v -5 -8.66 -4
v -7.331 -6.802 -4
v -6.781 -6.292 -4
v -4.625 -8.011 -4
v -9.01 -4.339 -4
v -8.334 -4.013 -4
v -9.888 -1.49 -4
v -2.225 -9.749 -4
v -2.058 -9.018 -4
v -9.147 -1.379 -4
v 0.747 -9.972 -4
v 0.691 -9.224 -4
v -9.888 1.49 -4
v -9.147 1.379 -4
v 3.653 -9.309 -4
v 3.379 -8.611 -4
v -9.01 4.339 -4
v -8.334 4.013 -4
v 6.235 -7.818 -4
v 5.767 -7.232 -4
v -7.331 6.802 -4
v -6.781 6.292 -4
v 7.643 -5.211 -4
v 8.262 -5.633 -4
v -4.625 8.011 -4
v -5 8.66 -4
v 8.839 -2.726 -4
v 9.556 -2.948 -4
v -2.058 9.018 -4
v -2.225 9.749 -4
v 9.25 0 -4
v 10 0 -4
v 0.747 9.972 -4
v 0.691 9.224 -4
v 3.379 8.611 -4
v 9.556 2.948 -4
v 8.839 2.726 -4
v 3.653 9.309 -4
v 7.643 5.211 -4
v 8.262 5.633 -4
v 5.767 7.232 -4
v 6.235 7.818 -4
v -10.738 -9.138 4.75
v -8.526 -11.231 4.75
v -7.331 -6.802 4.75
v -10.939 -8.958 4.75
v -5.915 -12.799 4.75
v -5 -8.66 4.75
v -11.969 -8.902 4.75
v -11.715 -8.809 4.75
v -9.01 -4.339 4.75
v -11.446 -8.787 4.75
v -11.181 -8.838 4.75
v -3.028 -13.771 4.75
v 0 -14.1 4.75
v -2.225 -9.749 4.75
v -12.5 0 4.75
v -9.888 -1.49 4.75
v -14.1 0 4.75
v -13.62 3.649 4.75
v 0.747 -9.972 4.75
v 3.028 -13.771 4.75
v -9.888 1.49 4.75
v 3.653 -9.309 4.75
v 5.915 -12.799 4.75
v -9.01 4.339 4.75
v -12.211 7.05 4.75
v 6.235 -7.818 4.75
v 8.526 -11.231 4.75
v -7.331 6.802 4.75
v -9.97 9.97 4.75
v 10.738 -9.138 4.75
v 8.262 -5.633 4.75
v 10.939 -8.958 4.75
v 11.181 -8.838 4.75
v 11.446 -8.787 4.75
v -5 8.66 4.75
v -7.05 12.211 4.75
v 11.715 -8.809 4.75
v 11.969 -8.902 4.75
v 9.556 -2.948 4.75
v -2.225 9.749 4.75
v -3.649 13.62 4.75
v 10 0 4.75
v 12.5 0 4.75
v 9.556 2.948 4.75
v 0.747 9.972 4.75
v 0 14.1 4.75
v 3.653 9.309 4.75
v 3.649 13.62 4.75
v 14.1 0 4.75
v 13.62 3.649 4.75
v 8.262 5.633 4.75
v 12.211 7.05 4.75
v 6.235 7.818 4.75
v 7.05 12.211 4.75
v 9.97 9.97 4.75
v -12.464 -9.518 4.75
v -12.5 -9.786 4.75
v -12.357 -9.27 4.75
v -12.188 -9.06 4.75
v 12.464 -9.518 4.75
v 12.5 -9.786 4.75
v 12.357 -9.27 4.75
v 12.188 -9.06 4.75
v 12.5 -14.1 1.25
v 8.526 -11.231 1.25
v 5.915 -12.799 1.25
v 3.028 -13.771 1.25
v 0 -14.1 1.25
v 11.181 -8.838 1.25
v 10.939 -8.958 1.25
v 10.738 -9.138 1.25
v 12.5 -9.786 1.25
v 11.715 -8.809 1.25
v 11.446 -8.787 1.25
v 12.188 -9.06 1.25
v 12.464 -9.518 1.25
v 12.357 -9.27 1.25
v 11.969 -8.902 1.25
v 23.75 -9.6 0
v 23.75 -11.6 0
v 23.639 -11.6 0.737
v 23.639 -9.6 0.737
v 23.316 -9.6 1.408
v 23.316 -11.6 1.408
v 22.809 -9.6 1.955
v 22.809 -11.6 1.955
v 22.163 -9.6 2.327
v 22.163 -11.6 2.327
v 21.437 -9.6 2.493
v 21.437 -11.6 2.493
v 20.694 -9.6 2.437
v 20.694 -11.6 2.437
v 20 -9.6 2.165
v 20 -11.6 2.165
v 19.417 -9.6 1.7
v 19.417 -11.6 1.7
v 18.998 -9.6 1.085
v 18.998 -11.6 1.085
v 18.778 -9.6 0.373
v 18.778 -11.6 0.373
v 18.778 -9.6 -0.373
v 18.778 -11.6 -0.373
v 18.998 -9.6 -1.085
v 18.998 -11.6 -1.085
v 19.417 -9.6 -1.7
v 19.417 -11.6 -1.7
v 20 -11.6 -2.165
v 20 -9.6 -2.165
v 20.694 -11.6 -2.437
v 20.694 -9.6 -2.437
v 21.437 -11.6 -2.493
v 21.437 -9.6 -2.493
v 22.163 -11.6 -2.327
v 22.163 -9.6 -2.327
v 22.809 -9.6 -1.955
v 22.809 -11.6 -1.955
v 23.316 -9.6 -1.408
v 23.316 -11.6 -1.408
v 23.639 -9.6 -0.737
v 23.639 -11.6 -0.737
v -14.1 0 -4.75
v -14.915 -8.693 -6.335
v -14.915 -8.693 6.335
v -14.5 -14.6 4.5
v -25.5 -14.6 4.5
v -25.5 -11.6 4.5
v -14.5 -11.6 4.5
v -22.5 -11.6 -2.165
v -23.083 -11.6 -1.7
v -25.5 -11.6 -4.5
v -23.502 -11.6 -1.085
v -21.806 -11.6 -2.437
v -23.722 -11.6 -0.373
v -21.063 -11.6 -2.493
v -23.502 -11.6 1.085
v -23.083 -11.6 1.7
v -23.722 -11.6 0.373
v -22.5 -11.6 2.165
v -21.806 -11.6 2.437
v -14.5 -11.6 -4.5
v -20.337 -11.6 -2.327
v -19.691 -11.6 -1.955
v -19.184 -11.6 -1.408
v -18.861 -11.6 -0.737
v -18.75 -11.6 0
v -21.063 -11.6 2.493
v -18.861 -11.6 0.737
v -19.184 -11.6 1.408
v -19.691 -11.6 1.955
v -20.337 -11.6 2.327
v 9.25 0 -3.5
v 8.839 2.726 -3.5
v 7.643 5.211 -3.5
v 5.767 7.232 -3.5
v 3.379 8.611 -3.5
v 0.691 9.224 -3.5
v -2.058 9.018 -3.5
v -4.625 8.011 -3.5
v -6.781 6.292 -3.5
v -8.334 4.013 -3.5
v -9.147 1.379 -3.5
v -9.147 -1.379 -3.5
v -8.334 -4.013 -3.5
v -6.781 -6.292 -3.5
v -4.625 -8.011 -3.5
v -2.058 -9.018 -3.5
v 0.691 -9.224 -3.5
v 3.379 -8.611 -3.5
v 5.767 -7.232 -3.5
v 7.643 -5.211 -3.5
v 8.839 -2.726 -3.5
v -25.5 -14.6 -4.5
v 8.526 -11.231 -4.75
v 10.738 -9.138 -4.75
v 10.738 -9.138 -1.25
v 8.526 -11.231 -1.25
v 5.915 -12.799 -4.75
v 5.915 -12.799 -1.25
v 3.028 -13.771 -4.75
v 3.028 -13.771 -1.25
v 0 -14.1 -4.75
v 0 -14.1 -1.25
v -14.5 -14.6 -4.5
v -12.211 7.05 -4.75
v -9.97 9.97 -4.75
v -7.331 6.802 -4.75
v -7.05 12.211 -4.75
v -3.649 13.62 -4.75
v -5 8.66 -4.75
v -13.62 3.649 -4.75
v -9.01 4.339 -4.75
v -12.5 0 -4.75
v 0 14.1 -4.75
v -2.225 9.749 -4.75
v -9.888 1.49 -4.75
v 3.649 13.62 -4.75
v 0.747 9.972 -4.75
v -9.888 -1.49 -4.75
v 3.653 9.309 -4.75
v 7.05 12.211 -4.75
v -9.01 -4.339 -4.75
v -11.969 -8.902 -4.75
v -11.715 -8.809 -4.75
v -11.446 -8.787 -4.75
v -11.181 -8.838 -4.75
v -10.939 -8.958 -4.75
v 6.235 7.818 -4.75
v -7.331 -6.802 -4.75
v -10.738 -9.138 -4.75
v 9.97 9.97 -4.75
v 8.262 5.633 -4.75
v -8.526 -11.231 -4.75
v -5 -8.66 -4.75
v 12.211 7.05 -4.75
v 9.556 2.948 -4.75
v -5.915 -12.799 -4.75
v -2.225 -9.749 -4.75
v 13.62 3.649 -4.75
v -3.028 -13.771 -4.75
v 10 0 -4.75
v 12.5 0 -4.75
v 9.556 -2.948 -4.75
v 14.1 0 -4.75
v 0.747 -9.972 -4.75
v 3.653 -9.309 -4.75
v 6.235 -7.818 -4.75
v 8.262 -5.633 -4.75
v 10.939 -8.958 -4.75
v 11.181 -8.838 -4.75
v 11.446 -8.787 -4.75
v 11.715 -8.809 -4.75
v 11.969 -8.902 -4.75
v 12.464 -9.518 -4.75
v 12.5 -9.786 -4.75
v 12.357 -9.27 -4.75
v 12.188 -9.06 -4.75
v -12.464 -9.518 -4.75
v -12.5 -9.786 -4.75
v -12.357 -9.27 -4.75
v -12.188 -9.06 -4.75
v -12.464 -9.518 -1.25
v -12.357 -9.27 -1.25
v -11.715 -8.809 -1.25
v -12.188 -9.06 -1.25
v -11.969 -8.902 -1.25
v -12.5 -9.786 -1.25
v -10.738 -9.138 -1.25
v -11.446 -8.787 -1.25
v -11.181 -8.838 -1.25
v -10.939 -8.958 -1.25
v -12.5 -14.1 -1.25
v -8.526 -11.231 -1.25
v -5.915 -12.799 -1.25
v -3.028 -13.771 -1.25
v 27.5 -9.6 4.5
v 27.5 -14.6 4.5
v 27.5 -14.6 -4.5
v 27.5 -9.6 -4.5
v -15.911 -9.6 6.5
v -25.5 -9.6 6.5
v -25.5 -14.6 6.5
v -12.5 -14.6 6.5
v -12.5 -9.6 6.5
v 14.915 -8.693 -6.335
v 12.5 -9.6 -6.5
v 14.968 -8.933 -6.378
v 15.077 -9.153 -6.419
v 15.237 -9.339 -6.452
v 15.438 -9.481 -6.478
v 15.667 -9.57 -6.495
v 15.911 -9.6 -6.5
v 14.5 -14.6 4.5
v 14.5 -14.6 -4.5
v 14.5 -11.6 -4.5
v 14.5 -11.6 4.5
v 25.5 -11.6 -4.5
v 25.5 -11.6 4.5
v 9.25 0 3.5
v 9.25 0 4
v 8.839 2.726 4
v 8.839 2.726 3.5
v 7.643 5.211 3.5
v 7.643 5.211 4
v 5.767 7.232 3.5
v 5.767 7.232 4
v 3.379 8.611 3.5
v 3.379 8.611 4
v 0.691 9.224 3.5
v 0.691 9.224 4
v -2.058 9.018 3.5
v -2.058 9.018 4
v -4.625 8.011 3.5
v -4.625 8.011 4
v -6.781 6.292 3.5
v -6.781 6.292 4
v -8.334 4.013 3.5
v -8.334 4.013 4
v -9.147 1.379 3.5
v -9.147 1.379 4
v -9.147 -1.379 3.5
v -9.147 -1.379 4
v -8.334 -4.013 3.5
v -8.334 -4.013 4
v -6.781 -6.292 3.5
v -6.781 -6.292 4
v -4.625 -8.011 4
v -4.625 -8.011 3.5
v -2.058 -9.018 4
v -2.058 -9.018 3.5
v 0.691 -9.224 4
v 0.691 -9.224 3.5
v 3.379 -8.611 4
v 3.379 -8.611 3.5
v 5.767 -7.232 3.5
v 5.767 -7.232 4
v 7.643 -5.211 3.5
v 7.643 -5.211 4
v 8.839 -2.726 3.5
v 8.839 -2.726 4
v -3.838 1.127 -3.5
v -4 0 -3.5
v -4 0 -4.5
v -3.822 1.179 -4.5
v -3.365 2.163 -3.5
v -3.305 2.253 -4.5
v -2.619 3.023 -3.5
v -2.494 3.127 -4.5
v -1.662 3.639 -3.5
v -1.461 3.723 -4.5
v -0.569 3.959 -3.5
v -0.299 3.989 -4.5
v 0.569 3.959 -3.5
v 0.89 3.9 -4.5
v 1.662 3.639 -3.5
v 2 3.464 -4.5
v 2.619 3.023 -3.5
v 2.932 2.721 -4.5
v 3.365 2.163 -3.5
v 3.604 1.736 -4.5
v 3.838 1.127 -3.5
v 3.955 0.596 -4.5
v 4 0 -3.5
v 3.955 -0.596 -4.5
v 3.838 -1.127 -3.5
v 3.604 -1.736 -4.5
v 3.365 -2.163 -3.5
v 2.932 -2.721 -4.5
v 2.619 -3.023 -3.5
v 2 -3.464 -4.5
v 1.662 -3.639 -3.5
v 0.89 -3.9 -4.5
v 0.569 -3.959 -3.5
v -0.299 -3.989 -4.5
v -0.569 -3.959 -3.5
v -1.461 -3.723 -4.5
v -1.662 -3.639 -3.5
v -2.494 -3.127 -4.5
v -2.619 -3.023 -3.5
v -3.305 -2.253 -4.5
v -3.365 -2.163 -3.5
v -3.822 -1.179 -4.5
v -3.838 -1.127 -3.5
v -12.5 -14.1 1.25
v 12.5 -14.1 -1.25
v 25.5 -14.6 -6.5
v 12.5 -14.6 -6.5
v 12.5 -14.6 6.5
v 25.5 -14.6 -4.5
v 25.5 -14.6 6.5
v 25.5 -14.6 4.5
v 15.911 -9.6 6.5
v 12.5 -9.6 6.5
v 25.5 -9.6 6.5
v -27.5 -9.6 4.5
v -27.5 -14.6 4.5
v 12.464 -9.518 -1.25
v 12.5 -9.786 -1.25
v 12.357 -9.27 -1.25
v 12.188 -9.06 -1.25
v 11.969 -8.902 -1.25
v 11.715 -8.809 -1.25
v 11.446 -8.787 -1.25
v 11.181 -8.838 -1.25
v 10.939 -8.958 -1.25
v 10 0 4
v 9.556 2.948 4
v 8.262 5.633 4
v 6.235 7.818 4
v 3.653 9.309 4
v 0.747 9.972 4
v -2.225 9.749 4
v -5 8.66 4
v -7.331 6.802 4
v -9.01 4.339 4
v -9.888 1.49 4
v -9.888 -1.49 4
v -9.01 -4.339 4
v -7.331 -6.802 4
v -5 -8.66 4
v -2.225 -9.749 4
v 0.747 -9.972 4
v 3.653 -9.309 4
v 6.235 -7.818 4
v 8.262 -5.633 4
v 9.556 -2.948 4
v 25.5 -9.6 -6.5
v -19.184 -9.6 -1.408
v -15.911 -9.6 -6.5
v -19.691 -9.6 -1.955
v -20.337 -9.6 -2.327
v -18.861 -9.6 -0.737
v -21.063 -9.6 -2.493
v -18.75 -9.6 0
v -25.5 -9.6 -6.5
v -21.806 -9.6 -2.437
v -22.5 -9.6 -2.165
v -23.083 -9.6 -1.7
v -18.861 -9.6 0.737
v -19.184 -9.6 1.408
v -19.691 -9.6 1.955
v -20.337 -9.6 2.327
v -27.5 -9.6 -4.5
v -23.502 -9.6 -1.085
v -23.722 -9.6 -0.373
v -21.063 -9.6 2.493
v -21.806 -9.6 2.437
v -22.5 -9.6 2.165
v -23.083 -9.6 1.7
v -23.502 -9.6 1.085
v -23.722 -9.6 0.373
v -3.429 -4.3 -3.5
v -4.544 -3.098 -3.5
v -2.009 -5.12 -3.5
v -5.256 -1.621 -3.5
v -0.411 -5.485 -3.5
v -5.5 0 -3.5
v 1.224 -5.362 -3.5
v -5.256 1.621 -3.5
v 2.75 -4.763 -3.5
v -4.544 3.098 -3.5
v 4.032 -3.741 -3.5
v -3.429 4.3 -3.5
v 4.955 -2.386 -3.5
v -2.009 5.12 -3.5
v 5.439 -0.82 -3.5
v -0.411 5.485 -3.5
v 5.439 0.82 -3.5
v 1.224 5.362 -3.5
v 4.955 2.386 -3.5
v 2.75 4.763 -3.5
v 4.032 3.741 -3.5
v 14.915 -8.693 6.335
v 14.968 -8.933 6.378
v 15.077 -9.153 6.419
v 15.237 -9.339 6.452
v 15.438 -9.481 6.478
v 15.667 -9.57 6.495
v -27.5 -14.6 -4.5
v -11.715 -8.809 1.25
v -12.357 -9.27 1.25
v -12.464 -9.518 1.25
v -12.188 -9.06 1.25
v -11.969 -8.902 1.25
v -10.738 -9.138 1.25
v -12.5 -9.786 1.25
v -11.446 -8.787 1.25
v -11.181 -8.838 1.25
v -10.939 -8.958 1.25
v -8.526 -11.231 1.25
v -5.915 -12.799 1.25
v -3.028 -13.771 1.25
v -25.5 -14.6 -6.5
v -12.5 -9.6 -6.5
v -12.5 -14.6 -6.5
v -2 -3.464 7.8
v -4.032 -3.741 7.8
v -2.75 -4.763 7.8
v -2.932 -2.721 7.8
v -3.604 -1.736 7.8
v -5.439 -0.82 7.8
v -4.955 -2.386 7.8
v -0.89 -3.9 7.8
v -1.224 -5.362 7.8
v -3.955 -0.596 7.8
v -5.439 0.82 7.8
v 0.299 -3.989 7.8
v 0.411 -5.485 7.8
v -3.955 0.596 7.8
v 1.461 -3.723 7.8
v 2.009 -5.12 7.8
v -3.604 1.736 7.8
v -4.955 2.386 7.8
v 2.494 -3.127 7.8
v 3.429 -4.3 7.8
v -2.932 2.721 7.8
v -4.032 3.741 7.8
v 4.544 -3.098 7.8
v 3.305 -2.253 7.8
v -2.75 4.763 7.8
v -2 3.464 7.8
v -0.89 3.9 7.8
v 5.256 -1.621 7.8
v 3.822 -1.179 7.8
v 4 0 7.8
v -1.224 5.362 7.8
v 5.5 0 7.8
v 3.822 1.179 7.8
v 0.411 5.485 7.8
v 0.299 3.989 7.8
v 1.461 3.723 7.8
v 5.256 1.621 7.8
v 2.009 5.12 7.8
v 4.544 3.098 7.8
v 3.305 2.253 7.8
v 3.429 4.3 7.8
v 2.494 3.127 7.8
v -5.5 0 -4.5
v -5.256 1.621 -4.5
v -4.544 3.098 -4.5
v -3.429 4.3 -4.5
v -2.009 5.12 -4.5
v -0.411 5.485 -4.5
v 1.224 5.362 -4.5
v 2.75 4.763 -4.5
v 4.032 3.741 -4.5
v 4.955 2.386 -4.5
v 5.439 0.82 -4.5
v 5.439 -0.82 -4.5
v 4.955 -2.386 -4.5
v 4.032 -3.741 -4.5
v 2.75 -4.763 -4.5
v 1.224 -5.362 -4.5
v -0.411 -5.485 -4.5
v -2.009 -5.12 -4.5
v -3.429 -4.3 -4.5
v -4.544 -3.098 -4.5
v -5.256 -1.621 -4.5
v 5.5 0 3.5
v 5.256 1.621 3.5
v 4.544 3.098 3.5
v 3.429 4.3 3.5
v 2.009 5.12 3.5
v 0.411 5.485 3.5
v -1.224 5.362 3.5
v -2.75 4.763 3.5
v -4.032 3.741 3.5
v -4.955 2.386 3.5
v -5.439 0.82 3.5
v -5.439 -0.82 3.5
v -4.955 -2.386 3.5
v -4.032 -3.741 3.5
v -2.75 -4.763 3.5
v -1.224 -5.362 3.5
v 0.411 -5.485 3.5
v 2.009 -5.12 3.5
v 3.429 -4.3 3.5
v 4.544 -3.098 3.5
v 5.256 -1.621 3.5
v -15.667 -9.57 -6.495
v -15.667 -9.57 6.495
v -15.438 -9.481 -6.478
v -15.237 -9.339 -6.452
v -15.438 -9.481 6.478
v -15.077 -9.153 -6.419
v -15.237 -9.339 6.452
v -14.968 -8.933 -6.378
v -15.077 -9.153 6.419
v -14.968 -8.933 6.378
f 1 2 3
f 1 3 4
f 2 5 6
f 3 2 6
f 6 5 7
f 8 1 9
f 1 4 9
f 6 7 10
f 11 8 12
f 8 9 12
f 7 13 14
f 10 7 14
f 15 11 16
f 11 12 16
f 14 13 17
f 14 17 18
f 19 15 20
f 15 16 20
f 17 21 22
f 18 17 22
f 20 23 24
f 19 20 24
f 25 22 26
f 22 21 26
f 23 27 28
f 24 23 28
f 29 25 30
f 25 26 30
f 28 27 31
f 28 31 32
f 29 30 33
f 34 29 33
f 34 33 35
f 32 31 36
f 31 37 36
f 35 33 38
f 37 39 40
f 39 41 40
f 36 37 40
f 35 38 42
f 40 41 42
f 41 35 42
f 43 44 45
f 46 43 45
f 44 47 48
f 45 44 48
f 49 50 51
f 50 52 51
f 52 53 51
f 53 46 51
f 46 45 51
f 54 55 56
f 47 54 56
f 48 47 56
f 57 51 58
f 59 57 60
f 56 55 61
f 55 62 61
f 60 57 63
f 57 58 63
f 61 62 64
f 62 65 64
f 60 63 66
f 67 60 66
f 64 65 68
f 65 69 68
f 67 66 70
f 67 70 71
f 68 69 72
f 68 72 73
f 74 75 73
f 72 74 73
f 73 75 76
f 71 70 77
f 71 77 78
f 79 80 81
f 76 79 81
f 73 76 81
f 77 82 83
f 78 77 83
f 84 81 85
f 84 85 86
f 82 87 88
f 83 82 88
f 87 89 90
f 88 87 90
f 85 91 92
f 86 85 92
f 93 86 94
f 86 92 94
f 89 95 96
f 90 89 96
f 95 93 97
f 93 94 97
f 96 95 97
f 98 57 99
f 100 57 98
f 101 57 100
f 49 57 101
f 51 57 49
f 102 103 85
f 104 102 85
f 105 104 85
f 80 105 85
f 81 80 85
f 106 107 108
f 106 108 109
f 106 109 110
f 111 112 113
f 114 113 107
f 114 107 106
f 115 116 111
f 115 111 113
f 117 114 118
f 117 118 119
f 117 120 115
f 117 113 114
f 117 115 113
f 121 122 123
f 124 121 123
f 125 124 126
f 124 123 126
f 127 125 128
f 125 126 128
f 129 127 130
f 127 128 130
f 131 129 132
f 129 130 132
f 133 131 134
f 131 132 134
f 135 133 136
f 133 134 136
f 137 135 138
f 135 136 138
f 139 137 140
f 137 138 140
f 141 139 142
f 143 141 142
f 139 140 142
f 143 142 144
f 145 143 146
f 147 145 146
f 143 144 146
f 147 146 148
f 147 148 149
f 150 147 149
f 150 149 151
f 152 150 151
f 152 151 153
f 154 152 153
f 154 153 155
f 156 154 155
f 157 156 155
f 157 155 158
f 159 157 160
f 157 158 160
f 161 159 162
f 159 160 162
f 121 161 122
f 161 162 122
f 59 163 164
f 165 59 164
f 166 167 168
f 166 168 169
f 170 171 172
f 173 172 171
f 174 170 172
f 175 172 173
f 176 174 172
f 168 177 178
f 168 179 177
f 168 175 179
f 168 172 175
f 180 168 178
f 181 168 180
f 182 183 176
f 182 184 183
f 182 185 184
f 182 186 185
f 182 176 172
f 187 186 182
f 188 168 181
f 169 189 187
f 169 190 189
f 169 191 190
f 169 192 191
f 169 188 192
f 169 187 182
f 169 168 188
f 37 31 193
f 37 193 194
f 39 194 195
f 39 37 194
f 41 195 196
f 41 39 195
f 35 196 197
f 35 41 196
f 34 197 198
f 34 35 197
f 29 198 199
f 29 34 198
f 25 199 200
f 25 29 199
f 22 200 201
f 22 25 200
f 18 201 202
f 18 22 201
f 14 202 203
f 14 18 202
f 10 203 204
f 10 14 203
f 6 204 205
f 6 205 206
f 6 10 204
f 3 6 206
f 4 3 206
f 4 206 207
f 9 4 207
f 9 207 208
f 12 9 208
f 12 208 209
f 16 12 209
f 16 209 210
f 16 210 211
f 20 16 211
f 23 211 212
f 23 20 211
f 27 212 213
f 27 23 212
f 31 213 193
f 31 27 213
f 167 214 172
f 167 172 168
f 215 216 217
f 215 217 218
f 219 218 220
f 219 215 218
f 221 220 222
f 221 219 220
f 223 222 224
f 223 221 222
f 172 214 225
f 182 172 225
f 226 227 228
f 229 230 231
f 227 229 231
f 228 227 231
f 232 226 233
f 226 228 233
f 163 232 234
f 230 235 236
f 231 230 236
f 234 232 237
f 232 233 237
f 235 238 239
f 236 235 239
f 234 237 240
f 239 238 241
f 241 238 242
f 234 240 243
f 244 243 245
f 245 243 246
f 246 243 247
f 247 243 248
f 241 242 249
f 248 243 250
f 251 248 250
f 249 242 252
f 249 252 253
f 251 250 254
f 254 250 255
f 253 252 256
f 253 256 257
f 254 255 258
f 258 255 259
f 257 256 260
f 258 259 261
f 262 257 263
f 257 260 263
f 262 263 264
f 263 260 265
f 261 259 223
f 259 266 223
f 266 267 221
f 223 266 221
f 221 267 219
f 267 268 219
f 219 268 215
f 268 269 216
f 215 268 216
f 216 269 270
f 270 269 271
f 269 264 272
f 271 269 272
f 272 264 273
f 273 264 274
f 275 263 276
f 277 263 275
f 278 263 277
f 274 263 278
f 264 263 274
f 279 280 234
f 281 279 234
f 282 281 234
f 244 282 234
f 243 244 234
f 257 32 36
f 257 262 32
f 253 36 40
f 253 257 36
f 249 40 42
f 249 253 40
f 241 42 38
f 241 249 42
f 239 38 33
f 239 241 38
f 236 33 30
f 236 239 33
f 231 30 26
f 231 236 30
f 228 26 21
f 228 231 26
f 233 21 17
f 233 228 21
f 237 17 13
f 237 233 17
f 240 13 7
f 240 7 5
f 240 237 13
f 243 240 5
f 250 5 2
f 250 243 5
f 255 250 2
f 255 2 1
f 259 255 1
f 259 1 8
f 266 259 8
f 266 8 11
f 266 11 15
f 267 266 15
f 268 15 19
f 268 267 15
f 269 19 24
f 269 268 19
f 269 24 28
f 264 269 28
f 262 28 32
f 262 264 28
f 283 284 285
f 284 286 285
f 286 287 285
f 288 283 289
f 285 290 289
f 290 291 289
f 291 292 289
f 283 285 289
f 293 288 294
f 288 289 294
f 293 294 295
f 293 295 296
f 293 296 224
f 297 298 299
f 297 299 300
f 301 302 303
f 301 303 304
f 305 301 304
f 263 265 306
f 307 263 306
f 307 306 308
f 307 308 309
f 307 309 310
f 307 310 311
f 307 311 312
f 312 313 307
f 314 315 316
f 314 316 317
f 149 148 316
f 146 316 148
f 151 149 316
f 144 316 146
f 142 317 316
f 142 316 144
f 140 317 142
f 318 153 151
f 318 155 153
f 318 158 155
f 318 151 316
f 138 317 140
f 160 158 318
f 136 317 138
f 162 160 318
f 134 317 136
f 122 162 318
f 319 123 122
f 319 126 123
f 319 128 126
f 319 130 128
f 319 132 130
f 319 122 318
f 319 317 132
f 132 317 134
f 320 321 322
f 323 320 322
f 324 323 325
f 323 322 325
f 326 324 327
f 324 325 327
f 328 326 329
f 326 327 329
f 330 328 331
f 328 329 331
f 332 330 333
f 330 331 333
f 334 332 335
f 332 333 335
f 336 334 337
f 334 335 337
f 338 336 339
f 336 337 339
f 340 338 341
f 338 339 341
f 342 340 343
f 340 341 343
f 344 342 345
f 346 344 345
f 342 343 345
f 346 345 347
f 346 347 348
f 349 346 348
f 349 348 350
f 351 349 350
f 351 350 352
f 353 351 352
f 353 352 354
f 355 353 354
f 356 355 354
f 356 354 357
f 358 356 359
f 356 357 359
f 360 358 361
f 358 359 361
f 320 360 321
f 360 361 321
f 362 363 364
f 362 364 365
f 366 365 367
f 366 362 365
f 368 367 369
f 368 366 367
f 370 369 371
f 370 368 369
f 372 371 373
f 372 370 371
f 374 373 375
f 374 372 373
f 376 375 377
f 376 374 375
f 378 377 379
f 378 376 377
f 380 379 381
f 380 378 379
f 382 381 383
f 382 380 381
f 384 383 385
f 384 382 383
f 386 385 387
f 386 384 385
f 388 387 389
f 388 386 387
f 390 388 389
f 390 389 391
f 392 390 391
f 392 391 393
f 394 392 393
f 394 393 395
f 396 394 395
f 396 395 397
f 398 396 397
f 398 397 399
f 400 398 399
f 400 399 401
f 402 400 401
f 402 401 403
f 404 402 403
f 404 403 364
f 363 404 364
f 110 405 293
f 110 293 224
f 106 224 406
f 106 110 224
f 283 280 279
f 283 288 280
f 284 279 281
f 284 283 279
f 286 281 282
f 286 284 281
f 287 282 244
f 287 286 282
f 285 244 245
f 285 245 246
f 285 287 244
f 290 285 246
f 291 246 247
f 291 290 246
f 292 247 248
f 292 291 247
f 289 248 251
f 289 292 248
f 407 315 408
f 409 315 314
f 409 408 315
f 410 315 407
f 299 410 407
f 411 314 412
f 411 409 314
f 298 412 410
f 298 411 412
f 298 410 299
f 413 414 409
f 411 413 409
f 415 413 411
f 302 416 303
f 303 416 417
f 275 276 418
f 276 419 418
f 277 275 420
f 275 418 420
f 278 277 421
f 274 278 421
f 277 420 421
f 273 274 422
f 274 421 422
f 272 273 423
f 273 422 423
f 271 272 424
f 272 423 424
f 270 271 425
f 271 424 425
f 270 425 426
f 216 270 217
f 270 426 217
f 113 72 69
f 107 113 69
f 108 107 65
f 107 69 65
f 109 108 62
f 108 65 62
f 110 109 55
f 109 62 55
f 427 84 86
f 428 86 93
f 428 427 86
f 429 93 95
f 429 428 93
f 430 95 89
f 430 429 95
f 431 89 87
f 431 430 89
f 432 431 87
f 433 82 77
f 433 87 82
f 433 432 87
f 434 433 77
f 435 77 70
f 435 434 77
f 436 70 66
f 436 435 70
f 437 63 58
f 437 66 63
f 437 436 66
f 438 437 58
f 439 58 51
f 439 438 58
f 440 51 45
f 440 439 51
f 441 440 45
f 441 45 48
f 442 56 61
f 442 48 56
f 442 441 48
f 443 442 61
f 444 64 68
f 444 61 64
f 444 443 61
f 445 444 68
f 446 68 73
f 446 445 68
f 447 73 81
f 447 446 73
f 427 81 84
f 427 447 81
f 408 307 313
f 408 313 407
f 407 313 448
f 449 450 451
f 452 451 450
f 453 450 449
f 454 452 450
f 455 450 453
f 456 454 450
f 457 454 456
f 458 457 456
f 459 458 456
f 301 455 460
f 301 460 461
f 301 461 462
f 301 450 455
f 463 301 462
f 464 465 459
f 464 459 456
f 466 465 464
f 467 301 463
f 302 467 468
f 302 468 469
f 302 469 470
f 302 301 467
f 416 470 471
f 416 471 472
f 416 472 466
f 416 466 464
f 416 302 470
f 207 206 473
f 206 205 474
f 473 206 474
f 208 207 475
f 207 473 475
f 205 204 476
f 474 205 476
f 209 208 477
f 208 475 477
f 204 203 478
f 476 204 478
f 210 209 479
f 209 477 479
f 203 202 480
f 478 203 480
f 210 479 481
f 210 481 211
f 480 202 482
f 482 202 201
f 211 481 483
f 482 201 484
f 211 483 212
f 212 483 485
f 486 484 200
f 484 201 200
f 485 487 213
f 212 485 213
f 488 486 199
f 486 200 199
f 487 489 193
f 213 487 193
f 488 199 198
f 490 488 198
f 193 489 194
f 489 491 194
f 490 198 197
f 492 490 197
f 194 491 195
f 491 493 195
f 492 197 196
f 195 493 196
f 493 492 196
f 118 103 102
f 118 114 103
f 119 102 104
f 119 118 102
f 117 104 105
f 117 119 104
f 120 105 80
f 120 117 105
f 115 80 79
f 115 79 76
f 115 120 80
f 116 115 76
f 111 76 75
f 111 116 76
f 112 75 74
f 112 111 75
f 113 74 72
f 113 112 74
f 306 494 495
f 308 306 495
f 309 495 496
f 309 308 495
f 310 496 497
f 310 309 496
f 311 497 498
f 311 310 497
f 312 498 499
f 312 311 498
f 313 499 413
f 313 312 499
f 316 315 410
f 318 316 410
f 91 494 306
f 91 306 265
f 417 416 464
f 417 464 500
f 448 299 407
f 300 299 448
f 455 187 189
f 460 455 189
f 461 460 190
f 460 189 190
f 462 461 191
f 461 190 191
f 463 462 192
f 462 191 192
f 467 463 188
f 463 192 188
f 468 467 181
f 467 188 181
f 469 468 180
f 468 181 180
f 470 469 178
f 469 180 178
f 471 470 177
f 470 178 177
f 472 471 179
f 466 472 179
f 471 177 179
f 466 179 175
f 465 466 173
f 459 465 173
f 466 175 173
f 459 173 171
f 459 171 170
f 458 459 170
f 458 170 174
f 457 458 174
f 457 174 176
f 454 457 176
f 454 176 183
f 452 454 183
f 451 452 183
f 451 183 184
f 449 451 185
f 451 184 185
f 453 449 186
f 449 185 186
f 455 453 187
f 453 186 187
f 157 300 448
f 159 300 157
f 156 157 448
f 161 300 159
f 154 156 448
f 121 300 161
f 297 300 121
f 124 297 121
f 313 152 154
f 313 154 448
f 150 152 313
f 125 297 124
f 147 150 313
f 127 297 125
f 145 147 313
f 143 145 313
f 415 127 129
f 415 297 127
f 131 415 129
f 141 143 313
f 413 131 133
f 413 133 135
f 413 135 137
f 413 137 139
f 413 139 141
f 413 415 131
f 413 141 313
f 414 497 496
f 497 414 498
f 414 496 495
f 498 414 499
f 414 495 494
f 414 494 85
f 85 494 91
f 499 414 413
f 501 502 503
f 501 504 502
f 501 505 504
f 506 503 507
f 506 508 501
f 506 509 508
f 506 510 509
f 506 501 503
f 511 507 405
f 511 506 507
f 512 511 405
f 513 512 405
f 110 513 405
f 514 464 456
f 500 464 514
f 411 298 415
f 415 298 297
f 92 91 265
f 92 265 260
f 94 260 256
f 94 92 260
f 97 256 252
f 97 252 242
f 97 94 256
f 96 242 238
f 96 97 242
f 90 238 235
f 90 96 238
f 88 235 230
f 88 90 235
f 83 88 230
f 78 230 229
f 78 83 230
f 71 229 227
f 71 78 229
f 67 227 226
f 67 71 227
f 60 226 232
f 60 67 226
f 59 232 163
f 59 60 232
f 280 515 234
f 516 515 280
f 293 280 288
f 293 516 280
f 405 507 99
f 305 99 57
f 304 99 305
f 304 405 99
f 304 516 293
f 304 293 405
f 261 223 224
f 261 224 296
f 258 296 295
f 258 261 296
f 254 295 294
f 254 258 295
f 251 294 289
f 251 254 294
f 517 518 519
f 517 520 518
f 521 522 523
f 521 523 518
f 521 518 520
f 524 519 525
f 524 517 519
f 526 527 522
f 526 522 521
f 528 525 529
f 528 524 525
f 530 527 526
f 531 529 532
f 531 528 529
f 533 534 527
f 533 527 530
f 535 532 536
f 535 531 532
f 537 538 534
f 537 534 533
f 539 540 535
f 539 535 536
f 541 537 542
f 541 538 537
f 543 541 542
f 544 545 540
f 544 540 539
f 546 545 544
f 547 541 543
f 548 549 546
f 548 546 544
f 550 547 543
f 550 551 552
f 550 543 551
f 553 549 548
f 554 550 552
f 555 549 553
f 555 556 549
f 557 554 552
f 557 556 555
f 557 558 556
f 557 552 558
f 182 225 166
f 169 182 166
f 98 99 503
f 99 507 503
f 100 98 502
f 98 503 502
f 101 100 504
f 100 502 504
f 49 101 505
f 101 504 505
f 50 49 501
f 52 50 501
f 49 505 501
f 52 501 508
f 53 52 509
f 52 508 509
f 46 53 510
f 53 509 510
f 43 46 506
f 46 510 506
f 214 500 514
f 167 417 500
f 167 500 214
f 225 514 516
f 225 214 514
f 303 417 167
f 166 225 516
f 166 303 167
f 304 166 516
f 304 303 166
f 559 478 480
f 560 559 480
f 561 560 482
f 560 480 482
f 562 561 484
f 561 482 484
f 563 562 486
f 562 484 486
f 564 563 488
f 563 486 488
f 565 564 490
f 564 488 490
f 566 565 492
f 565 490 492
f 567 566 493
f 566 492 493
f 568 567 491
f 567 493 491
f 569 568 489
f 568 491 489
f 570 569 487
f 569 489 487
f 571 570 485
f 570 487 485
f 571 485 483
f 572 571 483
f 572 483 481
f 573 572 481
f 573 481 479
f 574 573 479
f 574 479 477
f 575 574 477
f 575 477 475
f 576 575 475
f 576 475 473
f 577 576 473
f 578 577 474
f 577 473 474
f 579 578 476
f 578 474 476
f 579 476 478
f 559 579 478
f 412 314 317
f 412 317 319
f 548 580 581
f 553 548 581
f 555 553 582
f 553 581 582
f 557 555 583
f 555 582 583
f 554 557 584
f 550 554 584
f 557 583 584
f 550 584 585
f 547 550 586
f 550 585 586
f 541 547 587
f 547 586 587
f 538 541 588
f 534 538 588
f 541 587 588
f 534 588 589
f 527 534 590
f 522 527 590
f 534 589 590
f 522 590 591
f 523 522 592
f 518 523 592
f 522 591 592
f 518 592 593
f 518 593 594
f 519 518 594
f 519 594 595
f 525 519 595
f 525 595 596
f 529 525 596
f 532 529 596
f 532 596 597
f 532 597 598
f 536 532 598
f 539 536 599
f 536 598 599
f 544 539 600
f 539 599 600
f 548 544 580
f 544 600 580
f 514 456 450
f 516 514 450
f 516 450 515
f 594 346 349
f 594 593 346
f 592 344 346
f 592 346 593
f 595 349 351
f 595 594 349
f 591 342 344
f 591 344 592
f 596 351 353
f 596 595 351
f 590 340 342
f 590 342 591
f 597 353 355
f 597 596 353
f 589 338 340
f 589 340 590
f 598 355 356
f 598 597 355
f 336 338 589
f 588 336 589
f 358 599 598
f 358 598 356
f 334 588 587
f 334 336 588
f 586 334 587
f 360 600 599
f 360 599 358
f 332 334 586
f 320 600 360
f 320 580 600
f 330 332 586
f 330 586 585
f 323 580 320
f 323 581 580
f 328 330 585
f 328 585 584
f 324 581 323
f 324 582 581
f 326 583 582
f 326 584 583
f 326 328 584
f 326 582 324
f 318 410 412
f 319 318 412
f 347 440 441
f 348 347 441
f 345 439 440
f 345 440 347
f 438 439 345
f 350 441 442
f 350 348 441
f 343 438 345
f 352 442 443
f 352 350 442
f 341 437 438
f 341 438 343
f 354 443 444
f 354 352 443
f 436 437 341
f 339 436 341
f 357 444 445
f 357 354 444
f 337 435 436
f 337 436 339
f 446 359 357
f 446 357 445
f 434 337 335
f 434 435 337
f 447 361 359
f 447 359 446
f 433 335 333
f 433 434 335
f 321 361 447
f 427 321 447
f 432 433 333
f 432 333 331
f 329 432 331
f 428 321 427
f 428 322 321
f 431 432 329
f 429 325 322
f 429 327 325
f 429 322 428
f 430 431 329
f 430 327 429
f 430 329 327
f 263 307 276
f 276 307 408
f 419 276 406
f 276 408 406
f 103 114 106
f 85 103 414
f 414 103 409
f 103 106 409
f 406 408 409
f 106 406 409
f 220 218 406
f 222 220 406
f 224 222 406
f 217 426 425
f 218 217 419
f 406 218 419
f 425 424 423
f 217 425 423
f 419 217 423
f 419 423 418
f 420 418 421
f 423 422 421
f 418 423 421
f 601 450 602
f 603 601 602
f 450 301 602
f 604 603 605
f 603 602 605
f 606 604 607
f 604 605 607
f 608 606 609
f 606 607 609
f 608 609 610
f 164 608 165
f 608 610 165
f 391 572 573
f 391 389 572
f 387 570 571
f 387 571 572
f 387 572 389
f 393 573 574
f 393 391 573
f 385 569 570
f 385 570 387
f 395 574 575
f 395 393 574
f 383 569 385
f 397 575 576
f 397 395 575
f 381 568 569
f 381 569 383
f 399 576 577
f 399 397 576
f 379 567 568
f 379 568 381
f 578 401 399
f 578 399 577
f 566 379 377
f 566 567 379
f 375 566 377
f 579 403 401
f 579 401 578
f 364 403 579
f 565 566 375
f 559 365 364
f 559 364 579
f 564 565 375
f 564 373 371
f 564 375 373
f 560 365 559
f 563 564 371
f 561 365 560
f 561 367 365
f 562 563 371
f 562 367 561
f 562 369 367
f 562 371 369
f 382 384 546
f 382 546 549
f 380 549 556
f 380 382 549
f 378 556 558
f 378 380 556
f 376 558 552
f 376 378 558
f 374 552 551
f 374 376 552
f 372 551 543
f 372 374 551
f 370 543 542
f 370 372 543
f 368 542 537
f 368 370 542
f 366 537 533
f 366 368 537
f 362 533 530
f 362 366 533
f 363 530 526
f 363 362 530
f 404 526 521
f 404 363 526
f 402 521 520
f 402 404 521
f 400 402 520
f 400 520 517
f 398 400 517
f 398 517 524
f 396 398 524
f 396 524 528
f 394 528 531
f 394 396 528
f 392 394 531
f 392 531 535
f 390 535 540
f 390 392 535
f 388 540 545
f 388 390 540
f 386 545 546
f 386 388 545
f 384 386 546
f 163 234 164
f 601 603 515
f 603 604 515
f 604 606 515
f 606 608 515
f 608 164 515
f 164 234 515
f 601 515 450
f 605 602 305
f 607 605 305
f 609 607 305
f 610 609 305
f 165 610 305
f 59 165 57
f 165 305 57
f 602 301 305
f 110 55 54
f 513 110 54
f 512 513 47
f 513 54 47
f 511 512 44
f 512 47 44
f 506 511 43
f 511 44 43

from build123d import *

# Parameters (mm, degrees)
SKETCH1_R           = 10
BOSS_EXTRUDE1_DEPTH = 4
SKETCH2_R           = 9.25
CUT_EXTRUDE2_DEPTH  = 0.5
SKETCH6_R           = 14.1
SKETCH6_R_2         = 10
BOSS_EXTRUDE4_DEPTH = 6.5
SKETCH7_OUTSIDE_W   = 27.678
SKETCH7_OUTSIDE_H   = 43.378
CUT_EXTRUDE6_DEPTH  = 28.5
SKETCH8_R           = 4
CUT_EXTRUDE7_DEPTH  = 7
SKETCH11_W          = 25
SKETCH11_H          = 1.75
CUT_EXTRUDE8_DEPTH  = 29.2
CUT_EXTRUDE9_DEPTH  = 3.5
SKETCH9_R           = 5.5
SKETCH9_R_2         = 4
BOSS_EXTRUDE5_DEPTH = 4.3
SKETCH10_R          = 5.5
SKETCH10_R_2        = 4
BOSS_EXTRUDE6_DEPTH = 1
SKETCH13_W          = 11
SKETCH13_H          = 9
CUT_EXTRUDE10_DEPTH = 3
SKETCH14_R          = 2.5
CUT_EXTRUDE11_DEPTH = 2
CHAMFER1_SIZE       = 2
FILLET1_R           = 1


with BuildPart() as part:
    # Sketch1 → Boss-Extrude1 (new body, symmetric)
    with BuildSketch(Plane.XY):
        Circle(SKETCH1_R)
    extrude(amount=BOSS_EXTRUDE1_DEPTH, both=True)

    # Sketch2 → Cut-Extrude2 (cut)
    with BuildSketch(Plane.XY.offset(4)):
        Circle(SKETCH2_R)
    cut_extrude2 = extrude(amount=-CUT_EXTRUDE2_DEPTH, mode=Mode.SUBTRACT)

    # Mirror1: Cut-Extrude2 across plane
    add(cut_extrude2.mirror(Plane.XY), mode=Mode.SUBTRACT)

    # Sketch6 → Boss-Extrude4 (add, symmetric)
    with BuildSketch(Plane.XY):
        Circle(SKETCH6_R)
        Circle(SKETCH6_R_2, mode=Mode.SUBTRACT)
        with BuildLine():
            ThreePointArc((4.2e-08, -14.1), (-9.9702056, -9.97020563), (-14.1, 0))
            Line((-14.1, 0), (-15, -9.6))
            Line((-15, -9.6), (-27.5, -9.6))
            Line((-27.5, -9.6), (-27.5, -14.6))
            Line((-27.5, -14.6), (-12.5, -14.6))
            Line((-12.5, -14.6), (-12.5, -14.1))
            Line((-12.5, -14.1), (4.2e-08, -14.1))
        make_face()
        with BuildLine():
            Line((15, -9.6), (14.1, 0))
            ThreePointArc((14.1, 0), (9.97020563, -9.9702056), (4.2e-08, -14.1))
            Line((4.2e-08, -14.1), (12.5, -14.1))
            Line((12.5, -14.1), (12.5, -14.6))
            Line((12.5, -14.6), (27.5, -14.6))
            Line((27.5, -14.6), (27.5, -9.6))
            Line((27.5, -9.6), (15, -9.6))
        make_face()
    extrude(amount=BOSS_EXTRUDE4_DEPTH, both=True)

    # Sketch7 outside → Cut-Extrude6 (cut, symmetric)
    with BuildSketch(Plane(origin=(0, 0, 0), x_dir=(0, 0, -1), z_dir=(1, 0, 0))):
        with Locations((0, -0.25)):
            Rectangle(SKETCH7_OUTSIDE_W, SKETCH7_OUTSIDE_H)
        Polygon((-6.5, -9.6), (-4.75, 0), (-4.75, 14.1), (4.75, 14.1), (4.75, 0), (6.5, -9.6), (6.5, -14.6), (-6.5, -14.6), align=None, mode=Mode.SUBTRACT)
    extrude(amount=CUT_EXTRUDE6_DEPTH, both=True, mode=Mode.SUBTRACT)

    # Sketch8 → Cut-Extrude7 (cut)
    with BuildSketch(Plane.XY.offset(3.5)):
        Circle(SKETCH8_R)
    extrude(amount=-CUT_EXTRUDE7_DEPTH, mode=Mode.SUBTRACT)

    # Sketch11 → Cut-Extrude8 (cut, through all)
    with BuildSketch(Plane.XZ.offset(14.1)):
        with Locations((0, 5.625)):
            Rectangle(SKETCH11_W, SKETCH11_H)
        with Locations((0, -5.625)):
            Rectangle(SKETCH11_W, SKETCH11_H)
    extrude(amount=-CUT_EXTRUDE8_DEPTH, mode=Mode.SUBTRACT)

    # Sketch12 → Cut-Extrude9 (cut)
    with BuildSketch(Plane.XY.offset(4.75)):
        with BuildLine():
            ThreePointArc((0, -14.1), (-7.308364514, -12.058101349), (-12.5, -6.523802572))
            Line((-12.5, -6.523802572), (-12.5, -14.1))
            Line((-12.5, -14.1), (0, -14.1))
        make_face()
        with BuildLine():
            ThreePointArc((12.5, -6.523802572), (7.308364514, -12.058101349), (0, -14.1))
            Line((0, -14.1), (12.5, -14.1))
            Line((12.5, -14.1), (12.5, -6.523802572))
        make_face()
    cut_extrude9 = extrude(amount=-CUT_EXTRUDE9_DEPTH, mode=Mode.SUBTRACT)

    # Mirror2: Cut-Extrude9 across plane
    add(cut_extrude9.mirror(Plane.XY), mode=Mode.SUBTRACT)

    # Sketch9 → Boss-Extrude5 (add)
    with BuildSketch(Plane.XY.offset(3.5)):
        Circle(SKETCH9_R)
        Circle(SKETCH9_R_2, mode=Mode.SUBTRACT)
    extrude(amount=BOSS_EXTRUDE5_DEPTH)

    # Sketch10 → Boss-Extrude6 (add)
    with BuildSketch(Plane(origin=(0, 0, -3.5), x_dir=(-1, 0, 0), z_dir=(0, 0, -1))):
        Circle(SKETCH10_R)
        Circle(SKETCH10_R_2, mode=Mode.SUBTRACT)
    extrude(amount=BOSS_EXTRUDE6_DEPTH)

    # Sketch13 → Cut-Extrude10 (cut)
    with BuildSketch(Plane.XZ.offset(14.6)):
        with Locations((-20, 0)):
            Rectangle(SKETCH13_W, SKETCH13_H)
        with Locations((20, 0)):
            Rectangle(SKETCH13_W, SKETCH13_H)
    extrude(amount=-CUT_EXTRUDE10_DEPTH, mode=Mode.SUBTRACT)

    # Sketch14 → Cut-Extrude11 (cut)
    with BuildSketch(Plane.XZ.offset(11.6)):
        with Locations((21.25, 0)):
            Circle(SKETCH14_R)
        with Locations((-21.25, 0)):
            Circle(SKETCH14_R)
    extrude(amount=-CUT_EXTRUDE11_DEPTH, mode=Mode.SUBTRACT)

    # Chamfer1
    chamfer1_edges = [part.edges().sort_by_distance(p)[0] for p in [
        (-27.5, -12.1, -6.5),
        (27.5, -12.1, 6.5),
        (-27.5, -12.1, 6.5),
        (27.5, -12.1, -6.5),
    ]]
    chamfer(chamfer1_edges, length=CHAMFER1_SIZE)

    # Fillet1
    fillet1_edges = [part.edges().sort_by_distance(p)[0] for p in [
        (-15, -9.6, 0),
        (-12.5, -6.523802572, 3),
        (15, -9.6, 0),
        (12.5, -6.523802572, 3),
        (-12.5, -6.523802572, -3),
        (12.5, -6.523802572, -3),
    ]]
    fillet(fillet1_edges, radius=FILLET1_R)


solid = part.part
